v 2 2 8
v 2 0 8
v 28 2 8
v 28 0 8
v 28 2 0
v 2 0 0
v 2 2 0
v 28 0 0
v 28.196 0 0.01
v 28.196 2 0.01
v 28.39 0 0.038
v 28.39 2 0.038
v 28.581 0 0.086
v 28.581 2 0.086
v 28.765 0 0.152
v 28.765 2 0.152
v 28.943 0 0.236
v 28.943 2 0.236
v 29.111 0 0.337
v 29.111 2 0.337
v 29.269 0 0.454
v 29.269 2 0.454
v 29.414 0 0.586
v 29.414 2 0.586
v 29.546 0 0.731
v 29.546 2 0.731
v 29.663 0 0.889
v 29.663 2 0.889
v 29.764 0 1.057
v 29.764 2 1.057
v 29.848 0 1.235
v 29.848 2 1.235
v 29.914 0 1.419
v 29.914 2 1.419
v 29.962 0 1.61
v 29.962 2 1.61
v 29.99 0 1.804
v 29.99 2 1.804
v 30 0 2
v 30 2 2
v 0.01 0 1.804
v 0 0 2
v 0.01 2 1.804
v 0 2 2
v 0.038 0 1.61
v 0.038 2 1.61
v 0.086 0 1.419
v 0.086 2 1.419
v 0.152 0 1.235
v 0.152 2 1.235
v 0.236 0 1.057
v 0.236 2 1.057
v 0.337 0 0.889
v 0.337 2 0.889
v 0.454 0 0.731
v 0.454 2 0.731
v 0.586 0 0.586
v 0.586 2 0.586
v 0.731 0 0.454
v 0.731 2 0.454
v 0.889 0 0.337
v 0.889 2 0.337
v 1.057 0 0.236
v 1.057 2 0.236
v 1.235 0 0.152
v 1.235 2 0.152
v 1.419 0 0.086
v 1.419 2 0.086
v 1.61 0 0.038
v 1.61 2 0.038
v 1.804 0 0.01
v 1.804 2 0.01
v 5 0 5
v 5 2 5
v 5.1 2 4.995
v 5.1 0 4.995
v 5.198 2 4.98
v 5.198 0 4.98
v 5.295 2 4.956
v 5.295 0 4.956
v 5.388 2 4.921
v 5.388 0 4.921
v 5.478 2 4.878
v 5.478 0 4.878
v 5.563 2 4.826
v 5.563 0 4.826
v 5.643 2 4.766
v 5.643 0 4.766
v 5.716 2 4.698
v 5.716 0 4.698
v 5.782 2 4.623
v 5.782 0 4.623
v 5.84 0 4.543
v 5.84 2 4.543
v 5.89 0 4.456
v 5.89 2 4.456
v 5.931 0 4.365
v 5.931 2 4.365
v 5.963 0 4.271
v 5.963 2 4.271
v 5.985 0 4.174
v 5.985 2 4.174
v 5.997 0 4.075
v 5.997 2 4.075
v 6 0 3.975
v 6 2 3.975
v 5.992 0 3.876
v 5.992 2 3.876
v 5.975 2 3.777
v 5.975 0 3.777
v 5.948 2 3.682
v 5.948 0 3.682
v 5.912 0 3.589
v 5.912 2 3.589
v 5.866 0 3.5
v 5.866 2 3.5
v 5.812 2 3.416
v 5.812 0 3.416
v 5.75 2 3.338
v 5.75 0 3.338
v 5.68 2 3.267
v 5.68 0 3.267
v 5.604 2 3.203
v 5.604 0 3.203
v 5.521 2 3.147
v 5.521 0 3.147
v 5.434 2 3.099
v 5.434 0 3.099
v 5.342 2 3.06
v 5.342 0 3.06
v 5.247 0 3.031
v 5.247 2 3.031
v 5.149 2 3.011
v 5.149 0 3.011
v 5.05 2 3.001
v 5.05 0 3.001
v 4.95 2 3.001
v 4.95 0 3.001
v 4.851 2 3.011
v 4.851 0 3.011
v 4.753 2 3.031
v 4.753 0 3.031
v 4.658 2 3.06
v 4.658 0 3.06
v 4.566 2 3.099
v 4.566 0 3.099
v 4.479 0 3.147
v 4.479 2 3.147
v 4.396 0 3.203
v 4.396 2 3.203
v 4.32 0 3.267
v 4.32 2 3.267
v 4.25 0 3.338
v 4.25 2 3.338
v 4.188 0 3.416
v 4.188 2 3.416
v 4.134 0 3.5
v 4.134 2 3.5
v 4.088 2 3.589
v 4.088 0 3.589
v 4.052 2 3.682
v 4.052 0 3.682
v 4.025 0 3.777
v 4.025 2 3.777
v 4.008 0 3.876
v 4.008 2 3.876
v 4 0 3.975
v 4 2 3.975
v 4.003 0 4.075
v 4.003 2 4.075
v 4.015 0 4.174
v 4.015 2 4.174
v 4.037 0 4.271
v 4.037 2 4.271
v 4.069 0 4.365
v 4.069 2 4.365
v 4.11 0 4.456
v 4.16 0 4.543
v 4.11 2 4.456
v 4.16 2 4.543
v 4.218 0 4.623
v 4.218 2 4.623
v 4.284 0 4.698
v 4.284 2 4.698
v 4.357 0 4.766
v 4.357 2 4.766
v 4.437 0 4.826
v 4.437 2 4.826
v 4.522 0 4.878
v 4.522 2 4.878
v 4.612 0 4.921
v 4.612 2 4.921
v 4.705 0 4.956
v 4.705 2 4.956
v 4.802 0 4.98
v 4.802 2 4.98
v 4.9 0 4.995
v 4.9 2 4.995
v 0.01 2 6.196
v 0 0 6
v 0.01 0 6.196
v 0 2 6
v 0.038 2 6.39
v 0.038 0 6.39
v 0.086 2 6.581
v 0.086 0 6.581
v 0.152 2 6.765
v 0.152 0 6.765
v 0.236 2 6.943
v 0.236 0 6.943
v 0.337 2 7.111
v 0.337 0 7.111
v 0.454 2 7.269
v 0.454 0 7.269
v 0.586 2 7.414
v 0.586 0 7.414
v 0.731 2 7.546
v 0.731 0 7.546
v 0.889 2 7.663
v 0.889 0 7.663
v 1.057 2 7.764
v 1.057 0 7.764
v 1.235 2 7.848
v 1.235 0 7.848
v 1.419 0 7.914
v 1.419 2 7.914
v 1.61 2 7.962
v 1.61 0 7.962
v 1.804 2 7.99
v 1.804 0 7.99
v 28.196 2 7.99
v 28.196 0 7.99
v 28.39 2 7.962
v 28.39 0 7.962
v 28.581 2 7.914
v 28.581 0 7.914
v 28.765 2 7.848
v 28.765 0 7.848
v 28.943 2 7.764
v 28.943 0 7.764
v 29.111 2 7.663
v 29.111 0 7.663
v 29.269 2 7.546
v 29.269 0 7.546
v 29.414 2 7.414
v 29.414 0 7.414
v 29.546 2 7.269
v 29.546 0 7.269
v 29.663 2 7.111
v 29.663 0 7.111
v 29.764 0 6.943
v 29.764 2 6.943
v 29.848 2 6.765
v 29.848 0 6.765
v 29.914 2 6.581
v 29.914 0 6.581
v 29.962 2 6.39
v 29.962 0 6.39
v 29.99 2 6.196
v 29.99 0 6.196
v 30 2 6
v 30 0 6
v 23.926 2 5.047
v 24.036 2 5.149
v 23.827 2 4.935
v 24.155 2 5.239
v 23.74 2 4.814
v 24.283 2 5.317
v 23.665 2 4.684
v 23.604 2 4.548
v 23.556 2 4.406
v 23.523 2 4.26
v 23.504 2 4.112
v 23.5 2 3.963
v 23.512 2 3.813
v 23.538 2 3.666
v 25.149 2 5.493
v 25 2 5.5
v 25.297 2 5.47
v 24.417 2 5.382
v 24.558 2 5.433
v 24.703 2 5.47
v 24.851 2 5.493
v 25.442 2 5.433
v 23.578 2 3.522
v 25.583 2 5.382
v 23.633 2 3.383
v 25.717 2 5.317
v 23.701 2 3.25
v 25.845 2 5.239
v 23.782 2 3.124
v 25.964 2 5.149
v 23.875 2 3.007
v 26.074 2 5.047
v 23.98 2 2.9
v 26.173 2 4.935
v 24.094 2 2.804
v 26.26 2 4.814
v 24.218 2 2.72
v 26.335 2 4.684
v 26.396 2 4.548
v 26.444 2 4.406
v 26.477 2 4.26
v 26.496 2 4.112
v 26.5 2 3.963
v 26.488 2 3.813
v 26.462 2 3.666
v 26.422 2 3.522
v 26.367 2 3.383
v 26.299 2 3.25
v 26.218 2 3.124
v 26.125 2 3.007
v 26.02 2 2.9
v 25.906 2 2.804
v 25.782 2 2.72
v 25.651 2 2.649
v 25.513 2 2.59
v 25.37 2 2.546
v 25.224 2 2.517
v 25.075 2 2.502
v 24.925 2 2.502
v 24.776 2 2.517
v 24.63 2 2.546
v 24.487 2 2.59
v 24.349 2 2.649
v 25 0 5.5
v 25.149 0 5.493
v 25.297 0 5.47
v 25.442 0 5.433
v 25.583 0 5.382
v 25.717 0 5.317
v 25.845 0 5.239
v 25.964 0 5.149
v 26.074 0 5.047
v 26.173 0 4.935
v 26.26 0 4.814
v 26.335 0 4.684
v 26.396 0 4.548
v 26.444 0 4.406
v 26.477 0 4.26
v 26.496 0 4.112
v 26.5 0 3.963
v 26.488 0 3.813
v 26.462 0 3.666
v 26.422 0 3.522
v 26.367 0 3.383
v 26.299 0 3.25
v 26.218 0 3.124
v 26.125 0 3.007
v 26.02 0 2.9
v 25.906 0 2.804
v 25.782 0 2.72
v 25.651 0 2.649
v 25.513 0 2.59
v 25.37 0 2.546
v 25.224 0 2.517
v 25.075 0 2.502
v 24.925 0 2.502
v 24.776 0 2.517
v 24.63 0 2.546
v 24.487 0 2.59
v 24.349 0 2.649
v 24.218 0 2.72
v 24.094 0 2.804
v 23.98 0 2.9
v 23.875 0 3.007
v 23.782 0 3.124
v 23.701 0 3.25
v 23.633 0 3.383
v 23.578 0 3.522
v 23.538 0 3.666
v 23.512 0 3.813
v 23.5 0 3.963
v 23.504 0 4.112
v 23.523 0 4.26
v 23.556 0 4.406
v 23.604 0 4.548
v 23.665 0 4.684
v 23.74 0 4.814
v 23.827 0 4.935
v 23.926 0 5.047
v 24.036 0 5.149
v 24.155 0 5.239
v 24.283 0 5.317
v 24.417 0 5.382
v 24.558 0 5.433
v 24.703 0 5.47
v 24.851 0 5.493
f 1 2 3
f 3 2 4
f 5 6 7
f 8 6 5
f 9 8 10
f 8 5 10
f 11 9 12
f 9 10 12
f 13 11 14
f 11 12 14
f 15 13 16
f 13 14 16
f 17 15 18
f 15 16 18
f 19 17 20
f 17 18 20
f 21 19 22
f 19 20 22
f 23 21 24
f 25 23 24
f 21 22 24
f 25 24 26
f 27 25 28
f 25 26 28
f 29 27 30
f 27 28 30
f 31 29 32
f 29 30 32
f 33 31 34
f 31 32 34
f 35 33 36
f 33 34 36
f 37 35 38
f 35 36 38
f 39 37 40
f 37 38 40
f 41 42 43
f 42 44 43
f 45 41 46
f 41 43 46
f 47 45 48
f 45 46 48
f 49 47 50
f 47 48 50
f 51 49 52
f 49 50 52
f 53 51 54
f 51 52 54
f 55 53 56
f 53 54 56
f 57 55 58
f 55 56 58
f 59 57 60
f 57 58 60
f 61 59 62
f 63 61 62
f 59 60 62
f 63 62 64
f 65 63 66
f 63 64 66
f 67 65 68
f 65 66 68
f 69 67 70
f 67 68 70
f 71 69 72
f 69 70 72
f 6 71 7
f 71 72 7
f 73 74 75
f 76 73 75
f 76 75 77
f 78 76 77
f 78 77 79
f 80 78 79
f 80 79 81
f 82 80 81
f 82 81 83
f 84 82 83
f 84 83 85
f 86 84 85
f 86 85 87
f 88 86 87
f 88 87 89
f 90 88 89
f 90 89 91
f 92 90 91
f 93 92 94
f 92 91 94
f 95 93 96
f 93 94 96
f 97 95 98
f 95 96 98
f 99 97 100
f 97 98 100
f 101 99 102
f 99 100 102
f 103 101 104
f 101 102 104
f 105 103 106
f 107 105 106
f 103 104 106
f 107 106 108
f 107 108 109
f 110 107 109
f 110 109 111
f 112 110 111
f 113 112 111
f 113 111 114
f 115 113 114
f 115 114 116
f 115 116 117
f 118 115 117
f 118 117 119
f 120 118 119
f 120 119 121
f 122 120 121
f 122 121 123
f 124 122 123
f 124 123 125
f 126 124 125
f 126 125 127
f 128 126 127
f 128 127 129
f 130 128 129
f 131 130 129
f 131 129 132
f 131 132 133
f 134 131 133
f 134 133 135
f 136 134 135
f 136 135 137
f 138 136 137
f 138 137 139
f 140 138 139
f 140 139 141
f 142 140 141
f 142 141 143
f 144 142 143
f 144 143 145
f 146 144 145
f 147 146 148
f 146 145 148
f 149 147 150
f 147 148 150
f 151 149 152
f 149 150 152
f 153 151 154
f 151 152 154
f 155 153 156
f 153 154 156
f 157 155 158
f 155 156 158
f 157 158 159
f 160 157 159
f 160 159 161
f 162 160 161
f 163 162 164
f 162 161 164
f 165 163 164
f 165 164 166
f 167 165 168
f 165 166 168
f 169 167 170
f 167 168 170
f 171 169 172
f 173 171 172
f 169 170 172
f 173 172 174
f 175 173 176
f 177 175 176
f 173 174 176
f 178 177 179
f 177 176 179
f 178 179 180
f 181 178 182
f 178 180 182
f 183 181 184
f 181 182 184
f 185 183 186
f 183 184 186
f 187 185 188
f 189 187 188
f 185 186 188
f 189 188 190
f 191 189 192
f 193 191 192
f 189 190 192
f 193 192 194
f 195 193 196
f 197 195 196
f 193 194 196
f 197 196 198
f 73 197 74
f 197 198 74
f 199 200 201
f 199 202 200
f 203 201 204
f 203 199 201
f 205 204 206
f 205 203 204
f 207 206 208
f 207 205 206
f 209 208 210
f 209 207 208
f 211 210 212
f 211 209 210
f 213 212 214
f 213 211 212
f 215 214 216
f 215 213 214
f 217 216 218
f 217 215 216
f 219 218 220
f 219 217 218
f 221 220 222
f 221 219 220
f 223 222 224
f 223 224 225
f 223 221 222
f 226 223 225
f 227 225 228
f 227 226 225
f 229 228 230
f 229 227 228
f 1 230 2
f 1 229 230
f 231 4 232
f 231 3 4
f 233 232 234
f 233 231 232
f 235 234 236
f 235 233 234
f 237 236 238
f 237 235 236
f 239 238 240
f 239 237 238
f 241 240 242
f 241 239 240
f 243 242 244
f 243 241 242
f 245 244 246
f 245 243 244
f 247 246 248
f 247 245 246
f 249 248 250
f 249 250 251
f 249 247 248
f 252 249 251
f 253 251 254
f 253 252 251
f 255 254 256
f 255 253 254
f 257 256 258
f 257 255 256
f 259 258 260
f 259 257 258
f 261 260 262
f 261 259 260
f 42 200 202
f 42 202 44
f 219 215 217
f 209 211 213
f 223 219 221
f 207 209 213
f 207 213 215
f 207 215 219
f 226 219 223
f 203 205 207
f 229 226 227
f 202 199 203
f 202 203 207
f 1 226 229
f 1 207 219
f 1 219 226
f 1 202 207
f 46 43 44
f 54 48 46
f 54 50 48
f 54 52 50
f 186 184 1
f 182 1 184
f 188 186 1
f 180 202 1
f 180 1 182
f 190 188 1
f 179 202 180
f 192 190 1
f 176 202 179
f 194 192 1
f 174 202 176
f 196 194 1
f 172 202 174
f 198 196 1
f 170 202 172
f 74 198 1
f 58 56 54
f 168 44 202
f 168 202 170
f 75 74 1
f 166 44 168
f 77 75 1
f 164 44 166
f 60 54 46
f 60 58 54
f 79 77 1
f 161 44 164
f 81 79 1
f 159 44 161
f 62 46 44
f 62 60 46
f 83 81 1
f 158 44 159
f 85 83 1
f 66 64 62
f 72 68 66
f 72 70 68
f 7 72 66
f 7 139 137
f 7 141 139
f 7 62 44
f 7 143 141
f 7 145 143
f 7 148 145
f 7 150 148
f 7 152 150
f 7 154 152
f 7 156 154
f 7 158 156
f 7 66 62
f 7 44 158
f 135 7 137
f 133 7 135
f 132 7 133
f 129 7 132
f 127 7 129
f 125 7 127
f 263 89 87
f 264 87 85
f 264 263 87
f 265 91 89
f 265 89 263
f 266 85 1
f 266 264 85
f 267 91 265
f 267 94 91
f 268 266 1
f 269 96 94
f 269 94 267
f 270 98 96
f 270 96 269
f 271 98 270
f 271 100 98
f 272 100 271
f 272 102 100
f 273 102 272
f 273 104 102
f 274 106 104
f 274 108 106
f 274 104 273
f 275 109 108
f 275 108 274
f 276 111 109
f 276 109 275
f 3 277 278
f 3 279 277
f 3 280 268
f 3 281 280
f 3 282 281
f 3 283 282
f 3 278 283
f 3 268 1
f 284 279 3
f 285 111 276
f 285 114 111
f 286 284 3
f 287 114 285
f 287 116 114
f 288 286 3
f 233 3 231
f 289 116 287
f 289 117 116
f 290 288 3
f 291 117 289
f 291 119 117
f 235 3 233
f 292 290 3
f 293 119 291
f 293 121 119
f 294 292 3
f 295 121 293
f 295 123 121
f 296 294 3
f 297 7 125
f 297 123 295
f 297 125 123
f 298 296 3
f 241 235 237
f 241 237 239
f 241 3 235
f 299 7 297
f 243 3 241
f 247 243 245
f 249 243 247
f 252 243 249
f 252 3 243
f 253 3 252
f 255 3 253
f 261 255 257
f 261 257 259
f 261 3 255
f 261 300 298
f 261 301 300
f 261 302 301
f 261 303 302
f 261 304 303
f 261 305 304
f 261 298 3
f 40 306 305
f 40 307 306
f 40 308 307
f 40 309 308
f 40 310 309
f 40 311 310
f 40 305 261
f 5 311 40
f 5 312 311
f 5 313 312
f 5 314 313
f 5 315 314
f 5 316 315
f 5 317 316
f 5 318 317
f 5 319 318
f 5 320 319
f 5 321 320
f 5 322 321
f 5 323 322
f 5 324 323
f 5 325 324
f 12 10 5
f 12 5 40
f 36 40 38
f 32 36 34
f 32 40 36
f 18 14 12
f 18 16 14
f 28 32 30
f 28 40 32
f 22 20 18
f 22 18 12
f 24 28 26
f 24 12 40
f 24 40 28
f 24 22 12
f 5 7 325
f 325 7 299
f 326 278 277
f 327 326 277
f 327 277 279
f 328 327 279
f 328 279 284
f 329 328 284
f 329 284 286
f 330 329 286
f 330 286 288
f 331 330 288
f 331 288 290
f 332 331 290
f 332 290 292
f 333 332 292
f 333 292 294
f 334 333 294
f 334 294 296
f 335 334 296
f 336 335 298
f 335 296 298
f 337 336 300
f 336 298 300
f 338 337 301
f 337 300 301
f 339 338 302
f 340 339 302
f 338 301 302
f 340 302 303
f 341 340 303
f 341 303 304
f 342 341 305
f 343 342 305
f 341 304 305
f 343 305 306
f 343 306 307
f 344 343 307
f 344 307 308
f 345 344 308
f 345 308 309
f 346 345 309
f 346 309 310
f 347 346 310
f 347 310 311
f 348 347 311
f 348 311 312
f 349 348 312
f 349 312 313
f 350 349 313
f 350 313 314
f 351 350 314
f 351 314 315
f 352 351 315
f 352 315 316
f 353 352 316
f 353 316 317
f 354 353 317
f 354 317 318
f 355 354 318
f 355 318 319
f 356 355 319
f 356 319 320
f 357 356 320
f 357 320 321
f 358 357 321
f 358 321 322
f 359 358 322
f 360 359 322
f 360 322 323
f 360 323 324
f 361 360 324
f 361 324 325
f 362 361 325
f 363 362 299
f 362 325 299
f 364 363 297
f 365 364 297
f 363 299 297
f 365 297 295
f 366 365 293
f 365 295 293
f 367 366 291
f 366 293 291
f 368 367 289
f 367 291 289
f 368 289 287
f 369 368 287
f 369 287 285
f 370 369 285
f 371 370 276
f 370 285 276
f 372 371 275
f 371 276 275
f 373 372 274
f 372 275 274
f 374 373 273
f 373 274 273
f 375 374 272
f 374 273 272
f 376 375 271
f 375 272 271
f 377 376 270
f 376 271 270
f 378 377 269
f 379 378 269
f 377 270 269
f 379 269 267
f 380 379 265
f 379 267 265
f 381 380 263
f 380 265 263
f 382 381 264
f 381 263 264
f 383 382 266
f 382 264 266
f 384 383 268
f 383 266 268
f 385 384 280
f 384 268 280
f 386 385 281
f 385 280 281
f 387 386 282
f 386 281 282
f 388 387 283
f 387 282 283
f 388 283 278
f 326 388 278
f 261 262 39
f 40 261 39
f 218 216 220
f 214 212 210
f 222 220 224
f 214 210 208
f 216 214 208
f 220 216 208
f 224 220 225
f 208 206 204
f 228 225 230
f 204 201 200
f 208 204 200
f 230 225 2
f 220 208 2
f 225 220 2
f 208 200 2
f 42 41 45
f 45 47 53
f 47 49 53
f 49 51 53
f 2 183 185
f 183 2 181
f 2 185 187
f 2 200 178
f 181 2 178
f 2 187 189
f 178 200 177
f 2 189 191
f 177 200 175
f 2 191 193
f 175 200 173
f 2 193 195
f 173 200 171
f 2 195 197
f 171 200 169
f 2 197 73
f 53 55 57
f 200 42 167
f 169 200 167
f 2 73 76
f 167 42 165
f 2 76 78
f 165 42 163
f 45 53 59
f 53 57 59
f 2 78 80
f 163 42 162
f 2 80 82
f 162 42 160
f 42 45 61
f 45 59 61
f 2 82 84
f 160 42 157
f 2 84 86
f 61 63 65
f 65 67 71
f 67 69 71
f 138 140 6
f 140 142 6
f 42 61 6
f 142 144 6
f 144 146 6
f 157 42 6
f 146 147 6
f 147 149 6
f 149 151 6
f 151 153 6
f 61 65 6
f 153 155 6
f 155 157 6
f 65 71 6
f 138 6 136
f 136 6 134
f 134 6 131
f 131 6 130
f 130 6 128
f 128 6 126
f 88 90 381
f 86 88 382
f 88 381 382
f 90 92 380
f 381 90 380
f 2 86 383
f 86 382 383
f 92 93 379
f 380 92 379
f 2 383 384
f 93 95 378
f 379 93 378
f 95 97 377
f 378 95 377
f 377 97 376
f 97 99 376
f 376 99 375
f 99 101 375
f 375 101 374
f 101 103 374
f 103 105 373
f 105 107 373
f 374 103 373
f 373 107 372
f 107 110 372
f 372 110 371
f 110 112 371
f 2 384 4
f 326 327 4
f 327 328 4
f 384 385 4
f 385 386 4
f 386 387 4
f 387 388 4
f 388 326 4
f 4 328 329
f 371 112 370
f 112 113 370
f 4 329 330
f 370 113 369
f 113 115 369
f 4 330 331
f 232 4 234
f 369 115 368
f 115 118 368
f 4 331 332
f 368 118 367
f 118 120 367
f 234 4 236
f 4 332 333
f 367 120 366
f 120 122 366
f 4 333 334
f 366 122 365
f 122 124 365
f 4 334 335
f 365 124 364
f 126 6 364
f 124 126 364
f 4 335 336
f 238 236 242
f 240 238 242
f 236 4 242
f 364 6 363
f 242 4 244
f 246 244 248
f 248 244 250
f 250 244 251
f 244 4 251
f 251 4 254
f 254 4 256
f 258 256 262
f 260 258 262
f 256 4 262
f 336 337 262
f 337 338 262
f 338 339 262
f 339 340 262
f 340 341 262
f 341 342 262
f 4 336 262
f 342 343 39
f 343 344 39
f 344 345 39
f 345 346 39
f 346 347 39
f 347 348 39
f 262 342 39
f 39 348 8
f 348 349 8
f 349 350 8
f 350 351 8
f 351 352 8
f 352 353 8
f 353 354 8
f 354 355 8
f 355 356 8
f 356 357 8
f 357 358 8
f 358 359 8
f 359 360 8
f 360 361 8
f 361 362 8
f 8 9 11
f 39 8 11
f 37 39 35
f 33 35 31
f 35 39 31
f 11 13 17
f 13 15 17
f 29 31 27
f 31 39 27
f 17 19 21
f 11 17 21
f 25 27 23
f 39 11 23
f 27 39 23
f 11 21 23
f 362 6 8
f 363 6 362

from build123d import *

# Parameters (mm, degrees)
SKETCH1_W           = 30
SKETCH1_H           = 8
BOSS_EXTRUDE1_DEPTH = 2
SKETCH2_R           = 1.5
CUT_EXTRUDE1_DEPTH  = 32.112698372
SKETCH3_R           = 1
CUT_EXTRUDE2_DEPTH  = 32.112698372
FILLET1_R           = 2


with BuildPart() as part:
    # Sketch1 → Boss-Extrude1 (new body)
    with BuildSketch(Plane(origin=(0, 0, 0), x_dir=(1, 0, 0), z_dir=(0, 1, 0))):
        with Locations((15, -4)):
            Rectangle(SKETCH1_W, SKETCH1_H)
    extrude(amount=BOSS_EXTRUDE1_DEPTH)

    # Sketch2 → Cut-Extrude1 (cut, through all)
    with BuildSketch(Plane(origin=(0, 2, 0), x_dir=(1, 0, 0), z_dir=(0, 1, 0))):
        with Locations(Location((25, -4, 0), (0, 0, 270))):
            Circle(SKETCH2_R)
    extrude(amount=-CUT_EXTRUDE1_DEPTH, mode=Mode.SUBTRACT)

    # Sketch3 → Cut-Extrude2 (cut, through all)
    with BuildSketch(Plane(origin=(0, 2, 0), x_dir=(1, 0, 0), z_dir=(0, 1, 0))):
        with Locations(Location((5, -4, 0), (0, 0, 270))):
            Circle(SKETCH3_R)
    extrude(amount=-CUT_EXTRUDE2_DEPTH, mode=Mode.SUBTRACT)

    # Fillet1
    fillet1_edges = [part.edges().sort_by_distance(p)[0] for p in [
        (0, 1, 0),
        (30, 1, 0),
        (30, 1, 8),
        (0, 1, 8),
    ]]
    fillet(fillet1_edges, radius=FILLET1_R)


solid = part.part
